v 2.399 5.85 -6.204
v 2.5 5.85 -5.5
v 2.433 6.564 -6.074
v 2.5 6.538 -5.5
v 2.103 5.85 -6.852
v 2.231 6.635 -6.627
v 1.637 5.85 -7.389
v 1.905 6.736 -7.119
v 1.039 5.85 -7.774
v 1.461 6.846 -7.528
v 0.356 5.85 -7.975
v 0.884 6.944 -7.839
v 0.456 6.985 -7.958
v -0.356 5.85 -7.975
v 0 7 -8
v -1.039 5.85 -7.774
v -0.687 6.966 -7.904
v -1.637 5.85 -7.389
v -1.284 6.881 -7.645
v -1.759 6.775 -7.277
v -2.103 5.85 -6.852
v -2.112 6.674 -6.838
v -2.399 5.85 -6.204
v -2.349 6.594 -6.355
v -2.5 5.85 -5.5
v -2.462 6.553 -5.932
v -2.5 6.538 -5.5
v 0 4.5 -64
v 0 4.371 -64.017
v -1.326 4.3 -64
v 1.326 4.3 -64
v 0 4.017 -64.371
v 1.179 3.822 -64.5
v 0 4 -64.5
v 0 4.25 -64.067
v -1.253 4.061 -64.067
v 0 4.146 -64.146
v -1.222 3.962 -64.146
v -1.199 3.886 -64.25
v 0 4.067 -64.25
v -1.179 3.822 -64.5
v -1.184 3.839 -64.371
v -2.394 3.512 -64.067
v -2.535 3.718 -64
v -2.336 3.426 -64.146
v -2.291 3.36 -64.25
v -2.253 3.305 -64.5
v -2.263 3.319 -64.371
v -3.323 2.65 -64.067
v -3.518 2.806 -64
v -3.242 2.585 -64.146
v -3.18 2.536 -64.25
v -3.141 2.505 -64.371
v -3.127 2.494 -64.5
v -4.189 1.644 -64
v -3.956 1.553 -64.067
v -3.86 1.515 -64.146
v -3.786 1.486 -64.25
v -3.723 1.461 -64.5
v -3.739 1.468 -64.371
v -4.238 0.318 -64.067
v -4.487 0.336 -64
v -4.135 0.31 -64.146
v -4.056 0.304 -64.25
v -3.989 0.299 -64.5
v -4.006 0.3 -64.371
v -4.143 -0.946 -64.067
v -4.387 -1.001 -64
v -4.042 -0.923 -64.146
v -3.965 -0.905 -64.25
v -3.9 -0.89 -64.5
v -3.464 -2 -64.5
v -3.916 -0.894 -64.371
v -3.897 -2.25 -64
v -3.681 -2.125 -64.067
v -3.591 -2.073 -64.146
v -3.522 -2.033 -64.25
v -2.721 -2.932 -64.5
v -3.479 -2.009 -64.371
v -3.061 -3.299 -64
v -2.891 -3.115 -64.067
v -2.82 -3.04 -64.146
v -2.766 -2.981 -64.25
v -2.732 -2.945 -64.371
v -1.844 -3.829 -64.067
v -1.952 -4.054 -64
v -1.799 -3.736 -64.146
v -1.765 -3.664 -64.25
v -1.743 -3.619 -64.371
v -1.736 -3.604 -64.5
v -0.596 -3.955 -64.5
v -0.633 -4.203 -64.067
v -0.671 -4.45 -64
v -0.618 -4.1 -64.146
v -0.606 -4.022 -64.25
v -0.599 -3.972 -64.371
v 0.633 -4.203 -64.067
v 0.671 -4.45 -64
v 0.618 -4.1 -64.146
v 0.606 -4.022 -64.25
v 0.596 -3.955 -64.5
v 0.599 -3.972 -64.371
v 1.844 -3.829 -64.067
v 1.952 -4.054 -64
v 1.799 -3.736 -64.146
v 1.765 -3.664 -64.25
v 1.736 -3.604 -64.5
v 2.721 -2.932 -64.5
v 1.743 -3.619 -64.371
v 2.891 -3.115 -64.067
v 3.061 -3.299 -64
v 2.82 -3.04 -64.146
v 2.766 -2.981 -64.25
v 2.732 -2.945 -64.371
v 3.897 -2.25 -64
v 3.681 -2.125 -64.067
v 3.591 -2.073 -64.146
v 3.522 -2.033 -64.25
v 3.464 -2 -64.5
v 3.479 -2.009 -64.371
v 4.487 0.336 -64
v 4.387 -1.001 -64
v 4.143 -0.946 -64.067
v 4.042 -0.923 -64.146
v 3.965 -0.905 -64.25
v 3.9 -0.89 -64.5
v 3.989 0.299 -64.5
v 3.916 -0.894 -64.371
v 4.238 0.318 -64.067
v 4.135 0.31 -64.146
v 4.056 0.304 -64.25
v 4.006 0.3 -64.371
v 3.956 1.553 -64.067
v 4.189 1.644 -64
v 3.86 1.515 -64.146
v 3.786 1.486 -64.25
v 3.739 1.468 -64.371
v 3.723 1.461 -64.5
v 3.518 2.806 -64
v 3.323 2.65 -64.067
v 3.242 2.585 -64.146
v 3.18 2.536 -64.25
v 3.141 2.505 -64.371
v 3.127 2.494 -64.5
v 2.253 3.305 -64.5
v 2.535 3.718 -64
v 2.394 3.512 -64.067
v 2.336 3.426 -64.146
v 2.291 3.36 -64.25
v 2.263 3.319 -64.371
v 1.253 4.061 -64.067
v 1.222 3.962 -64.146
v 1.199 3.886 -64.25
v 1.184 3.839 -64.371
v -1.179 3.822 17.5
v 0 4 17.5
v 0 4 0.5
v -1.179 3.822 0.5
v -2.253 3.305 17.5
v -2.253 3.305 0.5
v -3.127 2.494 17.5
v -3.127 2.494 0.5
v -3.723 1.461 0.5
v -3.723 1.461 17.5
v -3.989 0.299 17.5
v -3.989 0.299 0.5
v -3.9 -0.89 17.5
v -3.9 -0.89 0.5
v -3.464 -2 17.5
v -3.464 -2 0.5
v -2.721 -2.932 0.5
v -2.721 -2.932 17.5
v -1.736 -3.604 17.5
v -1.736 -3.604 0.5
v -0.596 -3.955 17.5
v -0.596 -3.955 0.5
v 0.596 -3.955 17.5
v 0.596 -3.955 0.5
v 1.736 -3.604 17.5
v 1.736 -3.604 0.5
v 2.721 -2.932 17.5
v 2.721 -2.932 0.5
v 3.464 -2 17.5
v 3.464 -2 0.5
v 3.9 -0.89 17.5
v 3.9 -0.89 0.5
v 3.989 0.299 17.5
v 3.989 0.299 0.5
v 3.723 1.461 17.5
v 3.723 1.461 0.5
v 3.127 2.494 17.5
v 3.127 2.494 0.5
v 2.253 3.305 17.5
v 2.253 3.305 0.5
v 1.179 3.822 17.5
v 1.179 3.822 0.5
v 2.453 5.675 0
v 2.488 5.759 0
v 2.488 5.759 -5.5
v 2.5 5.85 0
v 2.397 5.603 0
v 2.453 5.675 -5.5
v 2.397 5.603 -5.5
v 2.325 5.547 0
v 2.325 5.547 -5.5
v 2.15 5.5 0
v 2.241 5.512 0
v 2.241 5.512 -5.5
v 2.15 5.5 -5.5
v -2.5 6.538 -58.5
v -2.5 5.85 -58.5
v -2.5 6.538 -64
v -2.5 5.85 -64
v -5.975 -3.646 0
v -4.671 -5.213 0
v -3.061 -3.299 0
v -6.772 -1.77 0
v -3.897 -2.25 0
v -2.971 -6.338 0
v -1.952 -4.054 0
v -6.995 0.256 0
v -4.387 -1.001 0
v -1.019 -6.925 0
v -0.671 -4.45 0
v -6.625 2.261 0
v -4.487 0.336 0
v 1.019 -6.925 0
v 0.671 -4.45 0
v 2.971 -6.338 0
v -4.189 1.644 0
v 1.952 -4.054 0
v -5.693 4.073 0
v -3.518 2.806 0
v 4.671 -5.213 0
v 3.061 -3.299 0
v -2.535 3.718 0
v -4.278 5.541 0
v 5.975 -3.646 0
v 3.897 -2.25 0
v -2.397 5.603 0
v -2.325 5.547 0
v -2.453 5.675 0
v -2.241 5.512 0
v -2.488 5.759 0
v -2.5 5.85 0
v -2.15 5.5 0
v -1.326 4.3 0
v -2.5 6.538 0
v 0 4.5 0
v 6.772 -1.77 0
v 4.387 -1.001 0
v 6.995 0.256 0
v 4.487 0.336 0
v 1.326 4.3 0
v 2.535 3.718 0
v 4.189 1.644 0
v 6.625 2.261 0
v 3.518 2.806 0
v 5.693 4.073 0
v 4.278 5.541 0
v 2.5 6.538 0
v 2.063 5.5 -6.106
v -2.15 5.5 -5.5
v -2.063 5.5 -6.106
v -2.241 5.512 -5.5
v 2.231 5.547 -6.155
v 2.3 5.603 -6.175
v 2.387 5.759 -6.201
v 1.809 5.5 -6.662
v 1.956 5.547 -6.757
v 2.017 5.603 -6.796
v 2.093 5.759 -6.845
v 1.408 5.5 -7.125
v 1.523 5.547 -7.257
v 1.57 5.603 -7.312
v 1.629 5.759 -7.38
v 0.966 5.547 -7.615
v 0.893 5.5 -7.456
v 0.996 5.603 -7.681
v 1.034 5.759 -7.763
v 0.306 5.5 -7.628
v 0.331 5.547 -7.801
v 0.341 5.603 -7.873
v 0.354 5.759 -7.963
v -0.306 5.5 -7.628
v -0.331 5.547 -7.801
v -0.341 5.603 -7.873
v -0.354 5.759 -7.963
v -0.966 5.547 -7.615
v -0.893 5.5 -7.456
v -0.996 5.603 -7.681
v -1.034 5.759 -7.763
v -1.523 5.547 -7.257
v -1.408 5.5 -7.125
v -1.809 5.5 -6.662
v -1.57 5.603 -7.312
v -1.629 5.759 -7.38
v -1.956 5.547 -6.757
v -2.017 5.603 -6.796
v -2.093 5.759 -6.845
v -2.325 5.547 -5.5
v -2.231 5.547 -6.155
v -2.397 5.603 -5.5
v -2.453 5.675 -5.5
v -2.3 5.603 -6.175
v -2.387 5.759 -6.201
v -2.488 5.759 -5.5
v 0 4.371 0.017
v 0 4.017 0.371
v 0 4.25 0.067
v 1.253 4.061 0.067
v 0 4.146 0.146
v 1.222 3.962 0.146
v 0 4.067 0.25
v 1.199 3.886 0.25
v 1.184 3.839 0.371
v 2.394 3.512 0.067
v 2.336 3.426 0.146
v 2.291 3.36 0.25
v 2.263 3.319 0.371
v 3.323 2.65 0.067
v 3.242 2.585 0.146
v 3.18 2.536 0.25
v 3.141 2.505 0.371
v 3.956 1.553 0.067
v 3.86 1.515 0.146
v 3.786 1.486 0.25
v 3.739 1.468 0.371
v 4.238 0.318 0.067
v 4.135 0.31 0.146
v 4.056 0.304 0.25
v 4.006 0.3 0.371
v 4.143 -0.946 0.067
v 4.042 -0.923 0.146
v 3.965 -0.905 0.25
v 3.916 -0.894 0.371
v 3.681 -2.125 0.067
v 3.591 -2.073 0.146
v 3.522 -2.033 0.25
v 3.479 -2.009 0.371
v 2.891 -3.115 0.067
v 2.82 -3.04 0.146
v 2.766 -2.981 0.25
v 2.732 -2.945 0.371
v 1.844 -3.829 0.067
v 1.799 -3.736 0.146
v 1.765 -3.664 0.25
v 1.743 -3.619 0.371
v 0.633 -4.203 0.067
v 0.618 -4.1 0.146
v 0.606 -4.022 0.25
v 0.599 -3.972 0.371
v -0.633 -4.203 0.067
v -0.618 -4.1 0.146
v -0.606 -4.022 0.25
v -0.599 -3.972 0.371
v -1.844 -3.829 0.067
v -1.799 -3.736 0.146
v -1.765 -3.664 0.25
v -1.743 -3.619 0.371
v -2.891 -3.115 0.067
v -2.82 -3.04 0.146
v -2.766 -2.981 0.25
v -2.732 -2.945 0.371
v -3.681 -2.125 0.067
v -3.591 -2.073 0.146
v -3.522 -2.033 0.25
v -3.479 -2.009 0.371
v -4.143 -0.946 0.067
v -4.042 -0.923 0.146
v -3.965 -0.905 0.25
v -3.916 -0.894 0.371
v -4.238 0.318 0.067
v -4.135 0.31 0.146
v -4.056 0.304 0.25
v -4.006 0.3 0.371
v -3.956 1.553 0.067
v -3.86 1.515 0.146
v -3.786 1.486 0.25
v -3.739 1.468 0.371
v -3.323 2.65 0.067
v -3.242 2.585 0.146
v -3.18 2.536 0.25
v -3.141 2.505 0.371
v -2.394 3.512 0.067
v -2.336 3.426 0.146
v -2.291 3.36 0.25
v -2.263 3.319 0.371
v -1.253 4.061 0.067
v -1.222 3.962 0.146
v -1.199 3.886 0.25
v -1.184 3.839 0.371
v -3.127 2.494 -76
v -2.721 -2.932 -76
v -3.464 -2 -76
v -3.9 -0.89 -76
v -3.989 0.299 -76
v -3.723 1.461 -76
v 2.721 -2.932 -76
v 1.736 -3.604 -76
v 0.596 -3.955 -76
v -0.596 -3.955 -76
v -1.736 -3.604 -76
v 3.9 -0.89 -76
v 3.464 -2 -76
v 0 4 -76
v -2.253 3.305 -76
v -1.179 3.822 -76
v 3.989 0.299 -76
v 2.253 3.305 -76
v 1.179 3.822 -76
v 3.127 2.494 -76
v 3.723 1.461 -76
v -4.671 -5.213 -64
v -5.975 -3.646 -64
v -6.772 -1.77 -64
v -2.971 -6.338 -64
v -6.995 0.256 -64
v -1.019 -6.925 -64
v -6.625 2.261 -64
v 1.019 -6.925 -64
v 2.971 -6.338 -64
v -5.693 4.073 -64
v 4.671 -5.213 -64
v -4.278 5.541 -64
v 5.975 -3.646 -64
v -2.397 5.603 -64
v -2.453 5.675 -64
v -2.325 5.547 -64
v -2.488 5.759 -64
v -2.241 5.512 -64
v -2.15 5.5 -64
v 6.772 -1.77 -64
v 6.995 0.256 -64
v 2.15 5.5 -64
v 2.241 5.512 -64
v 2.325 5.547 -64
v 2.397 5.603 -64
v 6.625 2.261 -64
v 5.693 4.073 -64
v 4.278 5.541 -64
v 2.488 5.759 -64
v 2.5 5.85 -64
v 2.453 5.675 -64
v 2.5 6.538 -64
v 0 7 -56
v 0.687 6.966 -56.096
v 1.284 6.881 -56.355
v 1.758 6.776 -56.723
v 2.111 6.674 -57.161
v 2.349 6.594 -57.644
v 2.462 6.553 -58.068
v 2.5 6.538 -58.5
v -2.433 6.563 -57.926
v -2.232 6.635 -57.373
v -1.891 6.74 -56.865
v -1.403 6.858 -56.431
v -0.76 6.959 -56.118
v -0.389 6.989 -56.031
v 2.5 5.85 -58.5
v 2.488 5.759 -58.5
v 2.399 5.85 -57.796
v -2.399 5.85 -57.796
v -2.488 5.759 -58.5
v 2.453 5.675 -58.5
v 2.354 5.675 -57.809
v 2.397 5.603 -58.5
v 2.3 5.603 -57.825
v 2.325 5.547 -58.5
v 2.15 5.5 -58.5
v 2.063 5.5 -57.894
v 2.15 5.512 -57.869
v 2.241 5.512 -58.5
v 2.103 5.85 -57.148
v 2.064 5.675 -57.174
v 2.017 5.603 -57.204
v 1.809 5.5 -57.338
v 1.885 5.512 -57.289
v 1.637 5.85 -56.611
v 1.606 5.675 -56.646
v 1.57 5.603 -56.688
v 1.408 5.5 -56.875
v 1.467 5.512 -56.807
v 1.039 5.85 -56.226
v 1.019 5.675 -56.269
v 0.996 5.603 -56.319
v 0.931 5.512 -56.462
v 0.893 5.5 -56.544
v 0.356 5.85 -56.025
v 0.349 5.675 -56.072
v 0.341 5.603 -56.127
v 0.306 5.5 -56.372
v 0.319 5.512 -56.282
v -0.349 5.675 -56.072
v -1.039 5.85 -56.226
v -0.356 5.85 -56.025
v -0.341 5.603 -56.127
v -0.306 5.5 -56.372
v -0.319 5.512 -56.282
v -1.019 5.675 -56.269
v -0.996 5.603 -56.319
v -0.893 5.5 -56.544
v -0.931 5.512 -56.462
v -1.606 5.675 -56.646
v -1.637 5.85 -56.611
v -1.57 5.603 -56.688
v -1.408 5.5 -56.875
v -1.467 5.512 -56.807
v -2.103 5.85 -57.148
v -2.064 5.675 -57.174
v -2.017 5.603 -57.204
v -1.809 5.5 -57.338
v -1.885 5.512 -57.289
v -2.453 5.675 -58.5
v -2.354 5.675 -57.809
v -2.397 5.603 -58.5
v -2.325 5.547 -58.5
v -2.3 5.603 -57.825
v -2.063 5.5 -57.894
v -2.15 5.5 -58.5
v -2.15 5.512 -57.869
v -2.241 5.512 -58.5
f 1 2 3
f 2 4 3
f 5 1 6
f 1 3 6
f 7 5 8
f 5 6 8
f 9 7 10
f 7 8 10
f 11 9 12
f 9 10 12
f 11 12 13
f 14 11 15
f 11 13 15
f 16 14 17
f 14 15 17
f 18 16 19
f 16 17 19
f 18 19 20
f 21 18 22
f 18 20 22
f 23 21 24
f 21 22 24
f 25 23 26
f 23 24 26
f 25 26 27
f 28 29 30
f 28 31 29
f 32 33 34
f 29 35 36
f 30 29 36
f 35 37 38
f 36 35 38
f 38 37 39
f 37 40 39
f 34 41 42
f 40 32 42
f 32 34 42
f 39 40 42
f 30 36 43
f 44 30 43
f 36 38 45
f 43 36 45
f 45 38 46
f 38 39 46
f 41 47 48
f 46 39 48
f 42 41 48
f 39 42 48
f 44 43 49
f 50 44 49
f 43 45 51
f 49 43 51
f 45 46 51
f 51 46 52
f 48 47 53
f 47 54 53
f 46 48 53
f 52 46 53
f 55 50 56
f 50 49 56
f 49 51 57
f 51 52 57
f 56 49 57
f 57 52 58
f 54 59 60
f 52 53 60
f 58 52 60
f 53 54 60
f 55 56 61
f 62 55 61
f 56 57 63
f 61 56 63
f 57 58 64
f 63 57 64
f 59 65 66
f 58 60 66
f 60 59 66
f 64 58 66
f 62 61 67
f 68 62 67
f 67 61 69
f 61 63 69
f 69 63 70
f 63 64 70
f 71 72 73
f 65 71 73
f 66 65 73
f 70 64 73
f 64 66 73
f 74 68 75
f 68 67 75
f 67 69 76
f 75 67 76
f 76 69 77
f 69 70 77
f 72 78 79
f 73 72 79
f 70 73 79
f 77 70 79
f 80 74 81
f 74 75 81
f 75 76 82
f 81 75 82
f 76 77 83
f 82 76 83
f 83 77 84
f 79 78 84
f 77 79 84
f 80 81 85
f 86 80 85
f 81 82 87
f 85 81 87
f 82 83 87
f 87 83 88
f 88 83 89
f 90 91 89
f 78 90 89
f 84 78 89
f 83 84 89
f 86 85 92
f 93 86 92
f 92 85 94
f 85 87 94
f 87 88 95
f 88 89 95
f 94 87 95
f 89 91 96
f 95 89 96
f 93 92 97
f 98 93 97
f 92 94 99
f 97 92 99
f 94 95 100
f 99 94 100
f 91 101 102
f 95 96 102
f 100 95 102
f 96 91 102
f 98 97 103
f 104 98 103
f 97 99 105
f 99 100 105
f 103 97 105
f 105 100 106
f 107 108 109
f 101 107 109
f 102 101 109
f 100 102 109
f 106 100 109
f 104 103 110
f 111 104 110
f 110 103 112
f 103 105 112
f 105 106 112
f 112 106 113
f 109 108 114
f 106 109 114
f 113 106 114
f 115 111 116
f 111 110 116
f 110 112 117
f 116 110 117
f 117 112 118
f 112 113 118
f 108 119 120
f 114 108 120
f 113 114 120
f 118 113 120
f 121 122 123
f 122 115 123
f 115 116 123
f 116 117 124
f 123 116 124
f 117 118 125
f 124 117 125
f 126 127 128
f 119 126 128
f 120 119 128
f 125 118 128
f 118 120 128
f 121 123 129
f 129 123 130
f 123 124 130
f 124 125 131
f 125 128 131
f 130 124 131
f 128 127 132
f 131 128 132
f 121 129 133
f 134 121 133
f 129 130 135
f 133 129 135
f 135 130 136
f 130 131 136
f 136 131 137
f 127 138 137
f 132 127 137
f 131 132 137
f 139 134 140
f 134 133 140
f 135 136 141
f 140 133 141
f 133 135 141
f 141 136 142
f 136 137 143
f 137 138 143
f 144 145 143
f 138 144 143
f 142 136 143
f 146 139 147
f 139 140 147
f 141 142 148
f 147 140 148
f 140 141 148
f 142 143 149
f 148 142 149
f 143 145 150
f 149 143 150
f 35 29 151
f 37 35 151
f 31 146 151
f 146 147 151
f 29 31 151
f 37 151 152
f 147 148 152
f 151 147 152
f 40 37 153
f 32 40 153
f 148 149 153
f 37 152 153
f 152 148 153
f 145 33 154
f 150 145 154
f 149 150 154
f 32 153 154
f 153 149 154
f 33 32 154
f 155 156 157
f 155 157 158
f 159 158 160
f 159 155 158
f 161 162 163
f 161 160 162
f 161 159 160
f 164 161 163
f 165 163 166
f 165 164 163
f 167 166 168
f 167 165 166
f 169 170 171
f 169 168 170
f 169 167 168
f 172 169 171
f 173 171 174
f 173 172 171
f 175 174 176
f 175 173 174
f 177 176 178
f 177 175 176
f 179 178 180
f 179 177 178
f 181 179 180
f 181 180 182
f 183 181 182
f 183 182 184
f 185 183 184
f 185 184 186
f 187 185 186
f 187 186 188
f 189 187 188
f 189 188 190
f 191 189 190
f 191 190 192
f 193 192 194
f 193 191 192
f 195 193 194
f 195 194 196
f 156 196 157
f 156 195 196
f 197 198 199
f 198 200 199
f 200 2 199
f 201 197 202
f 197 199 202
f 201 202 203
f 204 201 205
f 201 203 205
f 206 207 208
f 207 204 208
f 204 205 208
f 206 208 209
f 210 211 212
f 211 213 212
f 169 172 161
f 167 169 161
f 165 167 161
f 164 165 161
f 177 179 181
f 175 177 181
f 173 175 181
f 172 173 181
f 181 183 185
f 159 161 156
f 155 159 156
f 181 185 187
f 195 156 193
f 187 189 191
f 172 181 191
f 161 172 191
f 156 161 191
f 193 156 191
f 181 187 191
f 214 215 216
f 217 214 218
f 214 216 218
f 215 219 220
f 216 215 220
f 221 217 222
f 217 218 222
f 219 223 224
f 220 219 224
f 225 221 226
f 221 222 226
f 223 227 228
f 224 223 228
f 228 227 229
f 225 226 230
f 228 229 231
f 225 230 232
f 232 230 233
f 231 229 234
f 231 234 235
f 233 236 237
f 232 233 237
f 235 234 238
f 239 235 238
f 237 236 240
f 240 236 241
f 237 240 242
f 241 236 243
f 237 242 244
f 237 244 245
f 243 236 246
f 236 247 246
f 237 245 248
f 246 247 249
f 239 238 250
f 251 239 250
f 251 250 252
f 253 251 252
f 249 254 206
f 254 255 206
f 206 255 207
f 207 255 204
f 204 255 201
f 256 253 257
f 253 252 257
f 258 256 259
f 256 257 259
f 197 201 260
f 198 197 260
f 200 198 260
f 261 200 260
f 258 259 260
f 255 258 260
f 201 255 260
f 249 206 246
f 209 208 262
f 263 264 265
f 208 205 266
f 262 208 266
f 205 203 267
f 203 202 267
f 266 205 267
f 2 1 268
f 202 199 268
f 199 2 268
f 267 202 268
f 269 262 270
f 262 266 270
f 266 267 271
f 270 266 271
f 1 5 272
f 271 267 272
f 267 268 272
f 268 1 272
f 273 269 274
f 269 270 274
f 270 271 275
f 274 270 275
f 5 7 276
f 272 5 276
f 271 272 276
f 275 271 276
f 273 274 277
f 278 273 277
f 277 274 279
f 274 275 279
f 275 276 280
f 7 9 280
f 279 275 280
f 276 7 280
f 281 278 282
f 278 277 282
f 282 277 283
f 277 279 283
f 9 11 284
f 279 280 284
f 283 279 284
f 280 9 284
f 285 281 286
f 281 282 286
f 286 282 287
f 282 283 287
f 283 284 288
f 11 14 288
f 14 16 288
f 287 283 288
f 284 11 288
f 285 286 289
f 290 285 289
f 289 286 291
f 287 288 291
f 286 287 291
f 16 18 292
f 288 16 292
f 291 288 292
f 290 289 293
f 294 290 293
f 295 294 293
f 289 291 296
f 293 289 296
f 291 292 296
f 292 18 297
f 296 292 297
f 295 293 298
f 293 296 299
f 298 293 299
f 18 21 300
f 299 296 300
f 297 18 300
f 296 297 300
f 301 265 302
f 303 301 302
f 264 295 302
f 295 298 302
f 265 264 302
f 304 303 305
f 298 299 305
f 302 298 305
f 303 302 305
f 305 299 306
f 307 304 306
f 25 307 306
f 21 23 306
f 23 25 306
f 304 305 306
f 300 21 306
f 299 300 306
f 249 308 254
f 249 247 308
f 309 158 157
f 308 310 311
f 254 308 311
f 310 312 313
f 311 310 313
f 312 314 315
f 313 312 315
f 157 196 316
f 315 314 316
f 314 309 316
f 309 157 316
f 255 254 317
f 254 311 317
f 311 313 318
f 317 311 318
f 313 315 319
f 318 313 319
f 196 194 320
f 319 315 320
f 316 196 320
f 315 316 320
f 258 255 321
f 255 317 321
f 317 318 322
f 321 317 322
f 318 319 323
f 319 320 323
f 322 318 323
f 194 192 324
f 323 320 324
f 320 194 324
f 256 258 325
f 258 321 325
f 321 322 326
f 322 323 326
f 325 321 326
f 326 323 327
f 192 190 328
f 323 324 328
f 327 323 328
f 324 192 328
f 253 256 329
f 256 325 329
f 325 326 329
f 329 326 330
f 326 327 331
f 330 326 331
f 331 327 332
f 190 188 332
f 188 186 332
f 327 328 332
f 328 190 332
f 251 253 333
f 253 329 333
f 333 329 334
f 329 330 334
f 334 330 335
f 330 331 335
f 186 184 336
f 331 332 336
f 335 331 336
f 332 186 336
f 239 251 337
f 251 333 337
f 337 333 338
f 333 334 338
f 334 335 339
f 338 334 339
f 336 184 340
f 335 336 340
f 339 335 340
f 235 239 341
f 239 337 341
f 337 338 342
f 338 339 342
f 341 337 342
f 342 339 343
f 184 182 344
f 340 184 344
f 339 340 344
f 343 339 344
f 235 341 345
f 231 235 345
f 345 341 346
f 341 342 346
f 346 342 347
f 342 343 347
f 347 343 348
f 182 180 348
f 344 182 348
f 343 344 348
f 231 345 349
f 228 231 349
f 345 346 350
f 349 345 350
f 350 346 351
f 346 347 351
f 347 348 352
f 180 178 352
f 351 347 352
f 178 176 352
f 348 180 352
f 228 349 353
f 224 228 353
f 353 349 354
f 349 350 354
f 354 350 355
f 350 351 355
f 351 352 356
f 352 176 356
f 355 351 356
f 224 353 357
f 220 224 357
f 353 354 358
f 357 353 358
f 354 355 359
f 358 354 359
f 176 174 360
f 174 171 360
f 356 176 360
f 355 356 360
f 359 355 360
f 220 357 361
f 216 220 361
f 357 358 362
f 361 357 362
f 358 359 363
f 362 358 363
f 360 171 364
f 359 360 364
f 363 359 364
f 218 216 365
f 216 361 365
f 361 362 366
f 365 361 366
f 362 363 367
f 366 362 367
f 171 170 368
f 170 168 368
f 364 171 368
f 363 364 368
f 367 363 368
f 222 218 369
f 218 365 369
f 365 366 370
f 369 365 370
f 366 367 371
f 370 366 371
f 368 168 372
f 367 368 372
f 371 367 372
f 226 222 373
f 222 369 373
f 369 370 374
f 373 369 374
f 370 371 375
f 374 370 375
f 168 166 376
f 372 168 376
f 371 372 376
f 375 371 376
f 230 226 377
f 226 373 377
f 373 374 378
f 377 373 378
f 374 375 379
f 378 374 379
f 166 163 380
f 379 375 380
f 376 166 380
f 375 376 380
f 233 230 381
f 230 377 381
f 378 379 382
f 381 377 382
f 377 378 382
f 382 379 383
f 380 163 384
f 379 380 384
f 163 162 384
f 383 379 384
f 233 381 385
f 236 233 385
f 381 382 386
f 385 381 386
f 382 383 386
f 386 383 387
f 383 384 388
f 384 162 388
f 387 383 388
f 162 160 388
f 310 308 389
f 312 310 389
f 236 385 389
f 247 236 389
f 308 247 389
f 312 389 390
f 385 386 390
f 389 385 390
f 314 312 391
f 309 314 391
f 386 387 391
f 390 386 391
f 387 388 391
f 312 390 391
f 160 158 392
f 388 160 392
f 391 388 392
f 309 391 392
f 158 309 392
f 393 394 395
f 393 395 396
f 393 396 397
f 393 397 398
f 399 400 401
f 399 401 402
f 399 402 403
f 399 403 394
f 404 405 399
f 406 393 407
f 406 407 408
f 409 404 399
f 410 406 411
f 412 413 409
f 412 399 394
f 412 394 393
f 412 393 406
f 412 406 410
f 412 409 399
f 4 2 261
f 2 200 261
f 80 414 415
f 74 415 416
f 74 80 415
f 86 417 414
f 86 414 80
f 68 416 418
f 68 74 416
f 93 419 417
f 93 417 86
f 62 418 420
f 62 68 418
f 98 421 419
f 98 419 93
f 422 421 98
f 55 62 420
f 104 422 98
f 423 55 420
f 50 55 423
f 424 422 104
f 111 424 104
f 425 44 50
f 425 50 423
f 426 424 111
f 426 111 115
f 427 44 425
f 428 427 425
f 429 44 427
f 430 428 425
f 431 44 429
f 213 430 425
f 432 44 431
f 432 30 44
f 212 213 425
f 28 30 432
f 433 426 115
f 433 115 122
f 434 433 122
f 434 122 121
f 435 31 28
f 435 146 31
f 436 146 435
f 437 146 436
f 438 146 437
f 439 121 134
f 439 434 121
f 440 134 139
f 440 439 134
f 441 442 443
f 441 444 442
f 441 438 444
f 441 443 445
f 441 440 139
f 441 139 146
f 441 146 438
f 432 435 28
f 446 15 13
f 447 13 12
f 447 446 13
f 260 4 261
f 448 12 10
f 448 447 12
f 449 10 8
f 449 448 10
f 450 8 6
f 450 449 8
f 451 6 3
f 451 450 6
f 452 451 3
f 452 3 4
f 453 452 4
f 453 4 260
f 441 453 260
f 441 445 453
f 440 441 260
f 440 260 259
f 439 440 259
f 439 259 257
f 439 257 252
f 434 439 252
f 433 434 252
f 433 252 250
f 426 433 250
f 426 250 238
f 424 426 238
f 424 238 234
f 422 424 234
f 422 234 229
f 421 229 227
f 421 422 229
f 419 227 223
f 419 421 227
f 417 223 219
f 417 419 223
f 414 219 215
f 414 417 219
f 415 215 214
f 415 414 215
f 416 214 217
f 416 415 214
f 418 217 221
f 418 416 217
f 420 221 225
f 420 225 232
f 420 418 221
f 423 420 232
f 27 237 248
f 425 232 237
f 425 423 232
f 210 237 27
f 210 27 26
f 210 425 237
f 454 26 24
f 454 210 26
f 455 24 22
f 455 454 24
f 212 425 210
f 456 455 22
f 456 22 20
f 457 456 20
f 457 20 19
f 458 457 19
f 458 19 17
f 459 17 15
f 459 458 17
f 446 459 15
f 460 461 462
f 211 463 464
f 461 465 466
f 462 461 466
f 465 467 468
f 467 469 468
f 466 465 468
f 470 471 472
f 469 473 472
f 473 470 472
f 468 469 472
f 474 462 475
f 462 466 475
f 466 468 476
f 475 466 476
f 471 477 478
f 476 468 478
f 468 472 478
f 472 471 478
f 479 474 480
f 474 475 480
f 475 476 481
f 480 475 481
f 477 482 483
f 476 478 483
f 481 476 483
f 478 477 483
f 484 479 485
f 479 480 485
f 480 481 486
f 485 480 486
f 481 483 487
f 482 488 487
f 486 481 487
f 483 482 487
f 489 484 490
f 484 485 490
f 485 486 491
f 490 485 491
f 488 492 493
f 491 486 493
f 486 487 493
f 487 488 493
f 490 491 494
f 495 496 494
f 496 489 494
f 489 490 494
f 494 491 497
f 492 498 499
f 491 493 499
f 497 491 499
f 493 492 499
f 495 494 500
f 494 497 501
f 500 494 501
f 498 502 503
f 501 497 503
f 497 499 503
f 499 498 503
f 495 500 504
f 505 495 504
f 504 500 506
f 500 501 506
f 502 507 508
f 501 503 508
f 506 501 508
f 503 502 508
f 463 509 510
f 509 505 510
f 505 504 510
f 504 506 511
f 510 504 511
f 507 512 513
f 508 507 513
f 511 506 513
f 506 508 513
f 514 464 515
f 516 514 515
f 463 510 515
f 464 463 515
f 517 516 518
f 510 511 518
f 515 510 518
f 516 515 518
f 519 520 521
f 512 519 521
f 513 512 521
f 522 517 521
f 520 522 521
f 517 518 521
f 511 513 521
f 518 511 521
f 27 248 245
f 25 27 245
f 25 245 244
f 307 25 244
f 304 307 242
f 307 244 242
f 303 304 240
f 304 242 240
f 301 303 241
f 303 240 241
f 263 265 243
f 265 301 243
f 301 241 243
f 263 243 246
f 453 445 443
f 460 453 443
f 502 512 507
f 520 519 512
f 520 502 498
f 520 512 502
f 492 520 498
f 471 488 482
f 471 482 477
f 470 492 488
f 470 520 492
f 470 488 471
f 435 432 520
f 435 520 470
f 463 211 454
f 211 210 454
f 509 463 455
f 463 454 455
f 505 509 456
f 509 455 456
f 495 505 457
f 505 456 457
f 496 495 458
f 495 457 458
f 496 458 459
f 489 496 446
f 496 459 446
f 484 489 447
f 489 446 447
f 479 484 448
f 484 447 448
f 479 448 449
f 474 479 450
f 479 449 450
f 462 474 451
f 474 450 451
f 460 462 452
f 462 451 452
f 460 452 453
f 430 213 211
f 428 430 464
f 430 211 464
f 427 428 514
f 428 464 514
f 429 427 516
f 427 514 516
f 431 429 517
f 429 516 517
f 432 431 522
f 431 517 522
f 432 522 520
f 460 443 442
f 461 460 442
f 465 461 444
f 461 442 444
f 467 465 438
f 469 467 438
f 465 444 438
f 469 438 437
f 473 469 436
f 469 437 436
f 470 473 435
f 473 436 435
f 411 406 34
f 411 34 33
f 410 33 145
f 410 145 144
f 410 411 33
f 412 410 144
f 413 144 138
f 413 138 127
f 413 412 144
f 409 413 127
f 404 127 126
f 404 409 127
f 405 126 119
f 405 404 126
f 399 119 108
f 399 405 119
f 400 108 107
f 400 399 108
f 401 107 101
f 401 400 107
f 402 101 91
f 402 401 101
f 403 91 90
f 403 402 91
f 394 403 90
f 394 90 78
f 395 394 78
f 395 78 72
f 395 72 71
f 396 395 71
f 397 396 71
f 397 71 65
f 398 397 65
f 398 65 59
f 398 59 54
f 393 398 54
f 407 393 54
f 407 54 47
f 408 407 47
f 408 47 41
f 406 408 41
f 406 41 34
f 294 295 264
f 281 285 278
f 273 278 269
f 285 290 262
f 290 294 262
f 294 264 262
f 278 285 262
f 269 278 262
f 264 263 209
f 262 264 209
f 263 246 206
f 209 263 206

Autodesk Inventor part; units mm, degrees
ref_plane "YZ Plane" through (0, 0, 0) normal (1, 0, 0) x (0, 1, 0)
sketch "Sketch1" plane through (0, 0, 0) normal (1, 0, 0) x (0, 1, 0)
  line L0 (0, 0) -> (7, 0)
  line L1 (7, 0) -> (7, -64)
  line L2 (7, -64) -> (0, -64)
  line L3 (0, 0) -> (0, -64)
  line L4 (0, 18.3308) -> (0, -79.8767)
  line L5 (0, -64) -> (4, -64)
  line L6 (4, -64) -> (4, -76)
  line L7 (4, -76) -> (4, -76)
  line L8 (0, -76) -> (0, -74)
  line L9 (0, -76) -> (4, -76)
  line L10 (0, -74) -> (0, -76)
  line L11 (4, -76) -> (0, -76)
  line L12 (0, -74) -> (0, -64)
  line L13 (0, 0) -> (4, 0)
  line L14 (4, 0) -> (4, 17.5)
  line L15 (4, 17.5) -> (0, 17.5)
  line L16 (0, 17.5) -> (0, 0)
  point P0 (0, -82)
  point P1 (0, -64)
  point P2 (0, 17.5)
  point P3 (4, 0)
  point P4 (0, -76)
  dimension "d0" = 7
  dimension "d1" = 64
  dimension "d7" = 12
  dimension "d11" = 4
  dimension "d35" = 4
  dimension "d36" = 17.5
ref_plane "Work Plane1" through (0, 0, 14.5) normal (0, 0, 1) x (1, 0, 0)
revolve "Revolution2" add sketch "Sketch1" angle 360 about axis through (0, 0, 18.3308) along (0, 0, -1)
sketch "Sketch4" plane through (0, 0, 0) normal (0, 0, 1) x (1, 0, 0)
  line L0 (0, 7) -> (2.5, 7)
  line L1 (2.5, 7) -> (-2.5, 7)
  line L2 (-2.5, 7) -> (-2.5, 5.5)
  line L3 (-2.5, 5.5) -> (2.5, 5.5)
  line L4 (2.5, 5.5) -> (2.5, 7)
  circle A0 centre (0, 0) radius 7 projected
  point P0 (0, 0)
  point P1 (0, 7)
  dimension "d37" = 2.5
  dimension "d38" = 5
  dimension "d39" = 1.5
extrude "Extrusion5" cut sketch "Sketch4" against normal blind 5.5 contours A0 L2 L1 | L0 L4 A0 | A0 L4 L3 L2 picked at (0, 6)
sketch "Sketch5" plane through (0, 0, -64) normal (0, 0, -1) x (-1, 0, 0)
  line L0 (0, 7) -> (2.5, 7)
  line L1 (2.5, 7) -> (-2.5, 7)
  line L2 (-2.5, 7) -> (-2.5, 5.5)
  line L3 (-2.5, 5.5) -> (2.5, 5.5)
  line L4 (2.5, 5.5) -> (2.5, 7)
  circle A0 centre (0, 0) radius 7 projected
  point P0 (0, 0)
  point P1 (0, 7)
  dimension "d42" = 2.5
  dimension "d43" = 5
  dimension "d44" = 1.5
extrude "Extrusion6" cut sketch "Sketch5" against normal blind 5.5 contours A0 L2 L1 | L0 L4 A0 | A0 L4 L3 L2 picked at (0, 6)
ref_plane "Work Plane2" through (0, 7, -32) normal (0, 1, 0) x (1, 0, 0)
sketch "Sketch6" plane through (0, 7, -32) normal (0, 1, 0) x (1, 0, 0)
  line L0 (2.5, -26.5) -> (-2.5, -26.5) projected
  circle A0 centre (0, -26.5) radius 2.5
  line L1 (-2.5, 26.5) -> (2.5, 26.5) projected
  circle A1 centre (0, 26.5) radius 2.5
  point P0 (0, -32)
extrude "Extrusion7" cut sketch "Sketch6" against normal blind 1.5
fillet "Fillet4" radius 0.35 6 edges at (0, 5.5, -8) (2.5, 5.5, -2.75) (-2.5, 5.5, -2.75) (-2.5, 5.5, -61.25) (2.5, 5.5, -61.25) (0, 5.5, -56)
fillet "Fillet5" radius 0.5 2 edges at (0, -4, 0) (0, -4, -64)
properties part number "eje1" material "PBT Plastic"
